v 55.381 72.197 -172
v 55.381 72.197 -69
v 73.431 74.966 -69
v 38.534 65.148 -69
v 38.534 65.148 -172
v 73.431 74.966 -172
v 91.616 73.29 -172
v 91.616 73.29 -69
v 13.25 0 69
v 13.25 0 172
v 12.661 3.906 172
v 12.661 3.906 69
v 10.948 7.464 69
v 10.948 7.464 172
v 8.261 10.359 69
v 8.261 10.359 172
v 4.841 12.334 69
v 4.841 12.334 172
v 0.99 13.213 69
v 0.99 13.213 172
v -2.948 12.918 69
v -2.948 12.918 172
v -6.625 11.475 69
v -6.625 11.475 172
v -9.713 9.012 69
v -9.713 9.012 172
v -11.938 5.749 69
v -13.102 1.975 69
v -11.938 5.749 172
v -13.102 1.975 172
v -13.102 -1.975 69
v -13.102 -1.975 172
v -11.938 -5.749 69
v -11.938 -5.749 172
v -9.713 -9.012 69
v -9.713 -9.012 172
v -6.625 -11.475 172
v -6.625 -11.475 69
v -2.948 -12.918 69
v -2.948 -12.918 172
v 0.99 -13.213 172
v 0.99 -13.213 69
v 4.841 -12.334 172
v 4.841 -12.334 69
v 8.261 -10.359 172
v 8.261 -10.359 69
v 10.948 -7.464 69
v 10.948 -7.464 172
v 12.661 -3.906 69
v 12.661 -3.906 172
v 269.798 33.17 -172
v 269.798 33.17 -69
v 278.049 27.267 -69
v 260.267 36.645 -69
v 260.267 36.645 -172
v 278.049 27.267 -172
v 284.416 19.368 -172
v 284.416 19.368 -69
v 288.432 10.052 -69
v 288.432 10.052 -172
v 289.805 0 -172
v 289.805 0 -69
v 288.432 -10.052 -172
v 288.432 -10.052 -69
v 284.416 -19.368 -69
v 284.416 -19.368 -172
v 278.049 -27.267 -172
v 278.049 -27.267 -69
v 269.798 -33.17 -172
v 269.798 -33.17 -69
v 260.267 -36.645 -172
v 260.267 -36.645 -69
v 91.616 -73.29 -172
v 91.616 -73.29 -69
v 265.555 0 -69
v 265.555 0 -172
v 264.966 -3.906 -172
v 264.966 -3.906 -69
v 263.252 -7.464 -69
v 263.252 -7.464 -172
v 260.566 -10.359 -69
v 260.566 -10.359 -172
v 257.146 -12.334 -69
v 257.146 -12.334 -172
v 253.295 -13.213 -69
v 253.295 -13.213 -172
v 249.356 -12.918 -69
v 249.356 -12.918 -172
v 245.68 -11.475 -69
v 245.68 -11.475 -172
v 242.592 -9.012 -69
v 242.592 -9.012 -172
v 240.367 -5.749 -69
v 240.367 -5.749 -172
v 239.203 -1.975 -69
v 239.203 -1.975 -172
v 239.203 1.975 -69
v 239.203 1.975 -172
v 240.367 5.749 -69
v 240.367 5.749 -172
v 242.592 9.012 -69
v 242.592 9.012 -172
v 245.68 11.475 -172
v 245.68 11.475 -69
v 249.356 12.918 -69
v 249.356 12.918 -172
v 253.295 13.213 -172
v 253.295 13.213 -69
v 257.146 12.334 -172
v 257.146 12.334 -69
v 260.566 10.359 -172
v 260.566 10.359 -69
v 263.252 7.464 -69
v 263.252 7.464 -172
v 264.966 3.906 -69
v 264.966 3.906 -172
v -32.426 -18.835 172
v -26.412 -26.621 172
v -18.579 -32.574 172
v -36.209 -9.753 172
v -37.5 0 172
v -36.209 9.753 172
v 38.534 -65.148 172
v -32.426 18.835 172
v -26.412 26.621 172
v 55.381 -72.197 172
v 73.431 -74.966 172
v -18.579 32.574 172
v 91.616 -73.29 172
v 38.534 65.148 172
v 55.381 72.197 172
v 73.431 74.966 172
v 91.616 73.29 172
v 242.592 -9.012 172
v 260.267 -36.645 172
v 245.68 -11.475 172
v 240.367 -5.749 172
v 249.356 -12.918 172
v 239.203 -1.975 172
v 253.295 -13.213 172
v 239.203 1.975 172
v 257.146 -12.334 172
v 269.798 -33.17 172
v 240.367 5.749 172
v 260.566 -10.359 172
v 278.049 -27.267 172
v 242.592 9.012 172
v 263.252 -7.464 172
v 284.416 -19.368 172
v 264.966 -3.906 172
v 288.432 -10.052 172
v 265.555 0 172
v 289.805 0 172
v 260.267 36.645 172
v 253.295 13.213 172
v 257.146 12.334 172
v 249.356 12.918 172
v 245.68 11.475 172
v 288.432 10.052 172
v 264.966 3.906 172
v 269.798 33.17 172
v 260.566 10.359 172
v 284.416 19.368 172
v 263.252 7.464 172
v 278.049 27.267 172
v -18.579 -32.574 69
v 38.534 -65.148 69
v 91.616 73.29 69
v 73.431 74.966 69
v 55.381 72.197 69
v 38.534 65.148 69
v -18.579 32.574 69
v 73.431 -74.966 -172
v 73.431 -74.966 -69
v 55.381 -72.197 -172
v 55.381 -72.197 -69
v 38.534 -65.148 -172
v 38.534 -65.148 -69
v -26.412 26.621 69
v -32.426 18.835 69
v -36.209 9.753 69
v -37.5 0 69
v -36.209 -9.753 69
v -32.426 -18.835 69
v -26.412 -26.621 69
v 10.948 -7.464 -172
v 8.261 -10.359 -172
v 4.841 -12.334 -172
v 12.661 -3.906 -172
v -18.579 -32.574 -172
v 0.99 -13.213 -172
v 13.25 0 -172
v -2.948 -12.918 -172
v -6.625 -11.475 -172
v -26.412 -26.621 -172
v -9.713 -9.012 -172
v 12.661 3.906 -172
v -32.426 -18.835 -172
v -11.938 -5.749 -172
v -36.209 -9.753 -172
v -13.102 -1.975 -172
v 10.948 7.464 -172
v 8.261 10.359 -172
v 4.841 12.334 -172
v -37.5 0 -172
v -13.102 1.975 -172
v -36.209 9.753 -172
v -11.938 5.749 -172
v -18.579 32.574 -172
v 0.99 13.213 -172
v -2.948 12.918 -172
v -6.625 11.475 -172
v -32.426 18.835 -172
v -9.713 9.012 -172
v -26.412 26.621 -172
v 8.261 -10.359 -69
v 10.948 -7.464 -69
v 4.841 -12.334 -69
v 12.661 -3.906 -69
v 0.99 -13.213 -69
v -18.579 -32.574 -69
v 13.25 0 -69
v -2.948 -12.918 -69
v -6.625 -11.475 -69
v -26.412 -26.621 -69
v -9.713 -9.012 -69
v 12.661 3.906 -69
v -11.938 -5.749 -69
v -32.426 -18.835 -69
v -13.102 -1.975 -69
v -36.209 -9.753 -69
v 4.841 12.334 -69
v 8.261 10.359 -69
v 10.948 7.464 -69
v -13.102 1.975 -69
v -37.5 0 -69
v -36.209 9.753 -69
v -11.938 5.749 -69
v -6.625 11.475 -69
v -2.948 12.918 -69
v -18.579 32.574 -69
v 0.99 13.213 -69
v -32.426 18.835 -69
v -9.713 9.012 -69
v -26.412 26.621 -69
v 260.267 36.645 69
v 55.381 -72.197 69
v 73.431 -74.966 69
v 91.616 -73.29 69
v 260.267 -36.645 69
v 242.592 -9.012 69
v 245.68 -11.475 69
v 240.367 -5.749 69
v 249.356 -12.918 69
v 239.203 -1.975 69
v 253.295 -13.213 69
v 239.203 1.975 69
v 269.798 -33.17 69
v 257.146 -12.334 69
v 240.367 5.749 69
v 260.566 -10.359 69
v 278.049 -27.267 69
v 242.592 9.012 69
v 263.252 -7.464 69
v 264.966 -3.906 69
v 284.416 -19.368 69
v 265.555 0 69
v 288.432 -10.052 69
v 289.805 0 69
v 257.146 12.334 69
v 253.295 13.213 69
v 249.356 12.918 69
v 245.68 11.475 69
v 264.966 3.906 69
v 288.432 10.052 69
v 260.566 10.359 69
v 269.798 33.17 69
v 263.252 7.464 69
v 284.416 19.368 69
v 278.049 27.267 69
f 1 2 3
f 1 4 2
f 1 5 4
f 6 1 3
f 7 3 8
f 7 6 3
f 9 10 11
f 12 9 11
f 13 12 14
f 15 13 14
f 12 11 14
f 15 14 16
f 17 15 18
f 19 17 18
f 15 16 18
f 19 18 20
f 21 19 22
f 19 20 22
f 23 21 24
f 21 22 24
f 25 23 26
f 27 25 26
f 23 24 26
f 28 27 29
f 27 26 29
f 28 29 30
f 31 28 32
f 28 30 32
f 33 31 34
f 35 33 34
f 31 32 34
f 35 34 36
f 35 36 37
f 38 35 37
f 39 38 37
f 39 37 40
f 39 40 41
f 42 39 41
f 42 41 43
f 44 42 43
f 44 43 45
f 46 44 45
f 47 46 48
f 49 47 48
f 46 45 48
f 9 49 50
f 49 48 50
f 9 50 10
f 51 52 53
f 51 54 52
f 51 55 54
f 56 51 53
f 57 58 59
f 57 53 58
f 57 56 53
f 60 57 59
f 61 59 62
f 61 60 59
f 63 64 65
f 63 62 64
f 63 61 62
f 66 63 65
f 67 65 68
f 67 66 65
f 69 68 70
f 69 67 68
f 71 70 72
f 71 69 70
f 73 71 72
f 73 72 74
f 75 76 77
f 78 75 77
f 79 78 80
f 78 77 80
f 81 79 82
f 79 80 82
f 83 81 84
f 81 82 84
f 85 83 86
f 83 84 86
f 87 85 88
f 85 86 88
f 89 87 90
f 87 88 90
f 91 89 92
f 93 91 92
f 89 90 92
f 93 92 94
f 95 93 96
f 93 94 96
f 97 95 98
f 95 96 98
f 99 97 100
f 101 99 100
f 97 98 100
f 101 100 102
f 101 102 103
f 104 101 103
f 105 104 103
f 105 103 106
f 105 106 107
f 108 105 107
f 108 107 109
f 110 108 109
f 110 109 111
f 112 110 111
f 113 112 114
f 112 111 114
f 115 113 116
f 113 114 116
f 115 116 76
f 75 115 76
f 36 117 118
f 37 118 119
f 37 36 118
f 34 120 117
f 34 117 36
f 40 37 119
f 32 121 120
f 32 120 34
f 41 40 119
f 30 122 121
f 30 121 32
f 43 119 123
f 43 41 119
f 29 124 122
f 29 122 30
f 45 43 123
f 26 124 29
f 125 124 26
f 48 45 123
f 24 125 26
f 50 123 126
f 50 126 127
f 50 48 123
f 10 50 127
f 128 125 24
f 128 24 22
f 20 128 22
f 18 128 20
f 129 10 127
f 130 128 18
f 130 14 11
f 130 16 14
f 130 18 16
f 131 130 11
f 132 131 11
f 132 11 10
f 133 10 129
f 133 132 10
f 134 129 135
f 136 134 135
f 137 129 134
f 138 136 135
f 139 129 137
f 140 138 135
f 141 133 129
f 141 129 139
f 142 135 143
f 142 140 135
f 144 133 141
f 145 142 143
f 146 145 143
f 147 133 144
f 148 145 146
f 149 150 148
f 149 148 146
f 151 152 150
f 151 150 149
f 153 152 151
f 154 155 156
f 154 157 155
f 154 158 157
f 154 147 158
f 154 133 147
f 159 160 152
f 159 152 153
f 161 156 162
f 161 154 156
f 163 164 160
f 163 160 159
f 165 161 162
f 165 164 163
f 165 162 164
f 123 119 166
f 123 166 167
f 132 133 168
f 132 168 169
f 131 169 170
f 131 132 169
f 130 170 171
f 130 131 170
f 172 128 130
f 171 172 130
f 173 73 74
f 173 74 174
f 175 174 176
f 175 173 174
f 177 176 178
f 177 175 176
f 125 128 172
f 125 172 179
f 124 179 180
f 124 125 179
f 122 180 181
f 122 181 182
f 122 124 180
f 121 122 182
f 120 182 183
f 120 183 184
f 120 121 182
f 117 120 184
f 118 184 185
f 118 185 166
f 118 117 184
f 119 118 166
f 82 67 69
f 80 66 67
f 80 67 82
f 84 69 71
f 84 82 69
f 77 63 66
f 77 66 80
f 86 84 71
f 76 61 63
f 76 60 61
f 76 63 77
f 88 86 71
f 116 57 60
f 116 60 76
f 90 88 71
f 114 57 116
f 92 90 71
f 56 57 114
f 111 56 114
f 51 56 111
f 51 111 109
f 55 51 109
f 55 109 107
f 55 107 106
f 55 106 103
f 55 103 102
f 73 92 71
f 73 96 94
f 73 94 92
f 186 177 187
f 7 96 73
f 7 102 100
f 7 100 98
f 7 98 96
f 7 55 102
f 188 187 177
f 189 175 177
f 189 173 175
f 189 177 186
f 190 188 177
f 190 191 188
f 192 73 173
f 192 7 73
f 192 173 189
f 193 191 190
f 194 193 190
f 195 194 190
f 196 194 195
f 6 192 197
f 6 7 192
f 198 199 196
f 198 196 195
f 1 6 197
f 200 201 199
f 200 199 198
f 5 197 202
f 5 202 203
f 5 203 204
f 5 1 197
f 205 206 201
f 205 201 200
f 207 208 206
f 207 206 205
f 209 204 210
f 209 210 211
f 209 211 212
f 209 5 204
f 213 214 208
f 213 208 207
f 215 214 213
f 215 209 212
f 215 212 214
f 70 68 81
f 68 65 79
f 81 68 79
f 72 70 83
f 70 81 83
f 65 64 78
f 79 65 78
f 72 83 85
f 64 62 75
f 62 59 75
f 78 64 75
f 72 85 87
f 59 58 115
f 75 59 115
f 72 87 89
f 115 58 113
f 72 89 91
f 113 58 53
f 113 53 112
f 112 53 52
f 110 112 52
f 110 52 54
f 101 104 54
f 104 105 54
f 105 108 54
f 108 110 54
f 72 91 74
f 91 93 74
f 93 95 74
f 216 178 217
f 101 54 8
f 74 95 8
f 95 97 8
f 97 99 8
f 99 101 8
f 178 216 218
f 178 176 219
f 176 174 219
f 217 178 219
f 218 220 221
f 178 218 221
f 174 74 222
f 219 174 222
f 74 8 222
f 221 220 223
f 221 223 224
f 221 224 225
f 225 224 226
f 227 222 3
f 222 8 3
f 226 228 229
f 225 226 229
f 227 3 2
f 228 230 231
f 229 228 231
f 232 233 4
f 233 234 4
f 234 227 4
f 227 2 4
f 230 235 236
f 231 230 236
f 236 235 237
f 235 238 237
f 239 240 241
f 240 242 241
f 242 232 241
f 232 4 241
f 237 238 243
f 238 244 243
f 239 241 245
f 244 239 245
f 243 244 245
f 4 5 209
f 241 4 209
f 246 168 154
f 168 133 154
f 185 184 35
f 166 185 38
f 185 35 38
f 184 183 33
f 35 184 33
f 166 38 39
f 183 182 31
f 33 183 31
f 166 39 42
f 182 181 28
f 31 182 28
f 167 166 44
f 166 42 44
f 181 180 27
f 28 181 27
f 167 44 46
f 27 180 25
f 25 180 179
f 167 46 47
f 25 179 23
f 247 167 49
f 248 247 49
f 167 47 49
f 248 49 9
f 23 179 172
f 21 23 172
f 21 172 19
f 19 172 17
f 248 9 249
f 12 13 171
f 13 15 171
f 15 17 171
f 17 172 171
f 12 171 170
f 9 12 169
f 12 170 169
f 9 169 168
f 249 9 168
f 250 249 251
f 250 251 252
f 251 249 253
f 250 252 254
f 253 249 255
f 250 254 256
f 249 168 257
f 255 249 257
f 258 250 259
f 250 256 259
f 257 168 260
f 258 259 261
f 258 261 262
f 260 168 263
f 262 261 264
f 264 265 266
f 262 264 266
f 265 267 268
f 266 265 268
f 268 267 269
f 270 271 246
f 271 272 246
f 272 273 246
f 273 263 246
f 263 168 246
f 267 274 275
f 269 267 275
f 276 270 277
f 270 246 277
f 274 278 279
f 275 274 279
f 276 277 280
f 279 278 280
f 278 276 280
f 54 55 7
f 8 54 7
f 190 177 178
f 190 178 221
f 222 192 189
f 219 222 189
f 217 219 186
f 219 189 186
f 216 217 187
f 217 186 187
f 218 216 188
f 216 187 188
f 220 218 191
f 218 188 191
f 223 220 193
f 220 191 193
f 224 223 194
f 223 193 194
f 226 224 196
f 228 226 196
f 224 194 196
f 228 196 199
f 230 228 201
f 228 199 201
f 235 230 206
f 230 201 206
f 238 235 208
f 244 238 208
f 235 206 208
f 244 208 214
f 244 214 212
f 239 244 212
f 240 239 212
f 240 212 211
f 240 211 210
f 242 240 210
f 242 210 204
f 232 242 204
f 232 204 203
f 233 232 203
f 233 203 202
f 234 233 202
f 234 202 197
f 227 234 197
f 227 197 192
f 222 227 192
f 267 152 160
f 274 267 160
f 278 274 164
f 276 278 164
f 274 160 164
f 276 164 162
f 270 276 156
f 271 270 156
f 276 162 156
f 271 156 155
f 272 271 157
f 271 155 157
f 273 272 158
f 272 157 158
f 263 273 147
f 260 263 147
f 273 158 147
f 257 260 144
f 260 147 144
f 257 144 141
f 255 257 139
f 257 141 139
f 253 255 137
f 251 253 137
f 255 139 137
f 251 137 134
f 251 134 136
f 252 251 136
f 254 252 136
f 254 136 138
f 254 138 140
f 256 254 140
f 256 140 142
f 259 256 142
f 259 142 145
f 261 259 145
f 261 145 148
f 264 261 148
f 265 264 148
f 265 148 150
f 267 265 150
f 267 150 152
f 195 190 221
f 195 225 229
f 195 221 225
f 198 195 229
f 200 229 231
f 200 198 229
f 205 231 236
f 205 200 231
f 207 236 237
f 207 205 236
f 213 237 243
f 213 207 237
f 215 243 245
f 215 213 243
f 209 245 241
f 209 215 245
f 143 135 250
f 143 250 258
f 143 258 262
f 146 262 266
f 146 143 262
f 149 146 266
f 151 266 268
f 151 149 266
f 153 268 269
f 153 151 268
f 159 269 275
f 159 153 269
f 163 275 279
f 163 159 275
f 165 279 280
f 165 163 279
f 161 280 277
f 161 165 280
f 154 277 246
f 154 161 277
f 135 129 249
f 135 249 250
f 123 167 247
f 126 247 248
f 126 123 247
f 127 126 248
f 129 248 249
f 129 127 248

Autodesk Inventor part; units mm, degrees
ref_plane "YZ Plane" through (0, 0, 0) normal (1, 0, 0) x (0, 1, 0)
ref_plane "XZ Plane" through (0, 0, 0) normal (0, 1, 0) x (-1, 0, 0)
ref_plane "工作平面1" through (0, 0, 172) normal (0, 0, 1) x (1, 0, 0)
sketch "草圖1" plane through (0, 0, 172) normal (0, 0, 1) x (1, 0, 0)
  line L0 (0, 0) -> (252.3048, 0) construction
  arc A0 (-18.5787, 32.5742) -> (-18.5787, -32.5742) centre (0, 0) ccw
  arc A1 (260.2671, -36.6449) -> (260.2671, 36.6449) centre (252.3048, 0) ccw
  line L1 (-18.5787, -32.5742) -> (38.534, -65.1485)
  line L2 (91.6161, 73.2899) -> (260.2671, 36.6449)
  line L3 (-18.5787, 32.5742) -> (38.534, 65.1485)
  line L4 (91.6161, -73.2899) -> (260.2671, -36.6449)
  arc A2 (38.534, -65.1485) -> (91.6161, -73.2899) centre (75.6914, 0) ccw
  arc A3 (91.6161, 73.2899) -> (38.534, 65.1485) centre (75.6914, 0) ccw
  dimension "d3" = 252.3048
  dimension "d4" = 75
  dimension "d6" = 75
  dimension "d51" = 75.6914
  dimension "d52" = 75
extrude "擠出1" add sketch "草圖1" against normal blind 103
sketch "草圖2" plane through (0, 0, 172) normal (0, 0, 1) x (1, 0, 0)
  arc A0 (-18.5787, 32.5742) -> (-18.5787, -32.5742) centre (0, 0) ccw projected
  circle A1 centre (0, 0) radius 13.25
  arc A2 (260.2671, -36.6449) -> (260.2671, 36.6449) centre (252.3048, 0) ccw projected
  circle A3 centre (252.3048, 0) radius 13.25
  point P0 (-10.9663, -35.8607)
  point P1 (-34.5251, 14.6378)
  point P2 (444.0649, 33.6154)
  point P3 (432.144, -37.2043)
  dimension "d11" = 26.5
  dimension "d13" = 26.5
extrude "擠出2" cut sketch "草圖2" against normal through all
sketch "草圖3" plane through (270.4933, 34.423, 172) normal (0.2123282, 0.9771984, 0) x (0.9771984, -0.2123282, 0)
  line L0 (-10.4648, 0) -> (-10.4648, 103) projected
  point P0 (-257.0166, 172)
  point P1 (-10.4648, 51.5)
  point P2 (-10.4648, 51.5)
hole "孔1" [suppressed]
sketch "草圖4" plane through (-8.9965, 38.0395, 172) normal (-0.4954325, 0.8686464, 0) x (0.8686464, 0.4954325, 0)
  line L0 (-11.0312, 0) -> (-11.0312, 103) projected
  point P0 (-11.0312, 172)
  point P1 (-11.0312, 51.5)
  point P2 (-11.0312, 51.5)
hole "孔2" [suppressed]
sketch "草圖6" plane through (-18.5787, -32.5742, 69) normal (-0.4954325, -0.8686464, 0) x (0.8686464, -0.4954325, 0)
  line L0 (0, 51.5) -> (0, 0) projected
  point P0 (0, -69)
  point P1 (0, 25.75)
hole "孔4" [suppressed]
sketch "草圖7" plane through (91.6161, -73.2899, 69) normal (0.2123282, -0.9771984, 0) x (0.9771984, 0.2123282, 0)
  line L0 (296.8516, 51.5) -> (296.8516, 0) projected
  point P0 (-73.9656, -69)
  point P1 (296.8516, 25.75)
hole "孔5" [suppressed]
mirror "鏡射1" about plane through (0, 0, 0) normal (0, 0, 1) of "擠出1", "擠出2"
equation "\"d3\" = R3"
equation "\"d51\" = 0.3 * R3"
equation "\"R3\" = T1A_R3"
equation "\"th3a\" = T1A_th3a"
equation "\"Width\" = T1A_R3_Width"
equation "\"d0\" = 0.5 * Width"
equation "\"T1A_R3\" = 252.3048"
equation "\"T1A_th3a\" = 45deg"
equation "\"T1A_R3_Width\" = 344"
equation "\"T1A_R1\" = 585.5331"
equation "\"T1A_R4\" = 320.6953"
equation "\"T1A_R5\" = 419.3047"
equation "\"T1A_R7\" = -221.7475"
equation "\"T1A_R8\" = 369.2781"
equation "\"T1A_R1_Width\" = 756"
equation "\"T1A_R2_Width\" = 756"
equation "\"T1A_R4_Width\" = 756"
equation "\"T1A_Joint_Width\" = 756"
properties part number "Type 1A R3延伸連接桿:1" material "密度7850的鋼"
